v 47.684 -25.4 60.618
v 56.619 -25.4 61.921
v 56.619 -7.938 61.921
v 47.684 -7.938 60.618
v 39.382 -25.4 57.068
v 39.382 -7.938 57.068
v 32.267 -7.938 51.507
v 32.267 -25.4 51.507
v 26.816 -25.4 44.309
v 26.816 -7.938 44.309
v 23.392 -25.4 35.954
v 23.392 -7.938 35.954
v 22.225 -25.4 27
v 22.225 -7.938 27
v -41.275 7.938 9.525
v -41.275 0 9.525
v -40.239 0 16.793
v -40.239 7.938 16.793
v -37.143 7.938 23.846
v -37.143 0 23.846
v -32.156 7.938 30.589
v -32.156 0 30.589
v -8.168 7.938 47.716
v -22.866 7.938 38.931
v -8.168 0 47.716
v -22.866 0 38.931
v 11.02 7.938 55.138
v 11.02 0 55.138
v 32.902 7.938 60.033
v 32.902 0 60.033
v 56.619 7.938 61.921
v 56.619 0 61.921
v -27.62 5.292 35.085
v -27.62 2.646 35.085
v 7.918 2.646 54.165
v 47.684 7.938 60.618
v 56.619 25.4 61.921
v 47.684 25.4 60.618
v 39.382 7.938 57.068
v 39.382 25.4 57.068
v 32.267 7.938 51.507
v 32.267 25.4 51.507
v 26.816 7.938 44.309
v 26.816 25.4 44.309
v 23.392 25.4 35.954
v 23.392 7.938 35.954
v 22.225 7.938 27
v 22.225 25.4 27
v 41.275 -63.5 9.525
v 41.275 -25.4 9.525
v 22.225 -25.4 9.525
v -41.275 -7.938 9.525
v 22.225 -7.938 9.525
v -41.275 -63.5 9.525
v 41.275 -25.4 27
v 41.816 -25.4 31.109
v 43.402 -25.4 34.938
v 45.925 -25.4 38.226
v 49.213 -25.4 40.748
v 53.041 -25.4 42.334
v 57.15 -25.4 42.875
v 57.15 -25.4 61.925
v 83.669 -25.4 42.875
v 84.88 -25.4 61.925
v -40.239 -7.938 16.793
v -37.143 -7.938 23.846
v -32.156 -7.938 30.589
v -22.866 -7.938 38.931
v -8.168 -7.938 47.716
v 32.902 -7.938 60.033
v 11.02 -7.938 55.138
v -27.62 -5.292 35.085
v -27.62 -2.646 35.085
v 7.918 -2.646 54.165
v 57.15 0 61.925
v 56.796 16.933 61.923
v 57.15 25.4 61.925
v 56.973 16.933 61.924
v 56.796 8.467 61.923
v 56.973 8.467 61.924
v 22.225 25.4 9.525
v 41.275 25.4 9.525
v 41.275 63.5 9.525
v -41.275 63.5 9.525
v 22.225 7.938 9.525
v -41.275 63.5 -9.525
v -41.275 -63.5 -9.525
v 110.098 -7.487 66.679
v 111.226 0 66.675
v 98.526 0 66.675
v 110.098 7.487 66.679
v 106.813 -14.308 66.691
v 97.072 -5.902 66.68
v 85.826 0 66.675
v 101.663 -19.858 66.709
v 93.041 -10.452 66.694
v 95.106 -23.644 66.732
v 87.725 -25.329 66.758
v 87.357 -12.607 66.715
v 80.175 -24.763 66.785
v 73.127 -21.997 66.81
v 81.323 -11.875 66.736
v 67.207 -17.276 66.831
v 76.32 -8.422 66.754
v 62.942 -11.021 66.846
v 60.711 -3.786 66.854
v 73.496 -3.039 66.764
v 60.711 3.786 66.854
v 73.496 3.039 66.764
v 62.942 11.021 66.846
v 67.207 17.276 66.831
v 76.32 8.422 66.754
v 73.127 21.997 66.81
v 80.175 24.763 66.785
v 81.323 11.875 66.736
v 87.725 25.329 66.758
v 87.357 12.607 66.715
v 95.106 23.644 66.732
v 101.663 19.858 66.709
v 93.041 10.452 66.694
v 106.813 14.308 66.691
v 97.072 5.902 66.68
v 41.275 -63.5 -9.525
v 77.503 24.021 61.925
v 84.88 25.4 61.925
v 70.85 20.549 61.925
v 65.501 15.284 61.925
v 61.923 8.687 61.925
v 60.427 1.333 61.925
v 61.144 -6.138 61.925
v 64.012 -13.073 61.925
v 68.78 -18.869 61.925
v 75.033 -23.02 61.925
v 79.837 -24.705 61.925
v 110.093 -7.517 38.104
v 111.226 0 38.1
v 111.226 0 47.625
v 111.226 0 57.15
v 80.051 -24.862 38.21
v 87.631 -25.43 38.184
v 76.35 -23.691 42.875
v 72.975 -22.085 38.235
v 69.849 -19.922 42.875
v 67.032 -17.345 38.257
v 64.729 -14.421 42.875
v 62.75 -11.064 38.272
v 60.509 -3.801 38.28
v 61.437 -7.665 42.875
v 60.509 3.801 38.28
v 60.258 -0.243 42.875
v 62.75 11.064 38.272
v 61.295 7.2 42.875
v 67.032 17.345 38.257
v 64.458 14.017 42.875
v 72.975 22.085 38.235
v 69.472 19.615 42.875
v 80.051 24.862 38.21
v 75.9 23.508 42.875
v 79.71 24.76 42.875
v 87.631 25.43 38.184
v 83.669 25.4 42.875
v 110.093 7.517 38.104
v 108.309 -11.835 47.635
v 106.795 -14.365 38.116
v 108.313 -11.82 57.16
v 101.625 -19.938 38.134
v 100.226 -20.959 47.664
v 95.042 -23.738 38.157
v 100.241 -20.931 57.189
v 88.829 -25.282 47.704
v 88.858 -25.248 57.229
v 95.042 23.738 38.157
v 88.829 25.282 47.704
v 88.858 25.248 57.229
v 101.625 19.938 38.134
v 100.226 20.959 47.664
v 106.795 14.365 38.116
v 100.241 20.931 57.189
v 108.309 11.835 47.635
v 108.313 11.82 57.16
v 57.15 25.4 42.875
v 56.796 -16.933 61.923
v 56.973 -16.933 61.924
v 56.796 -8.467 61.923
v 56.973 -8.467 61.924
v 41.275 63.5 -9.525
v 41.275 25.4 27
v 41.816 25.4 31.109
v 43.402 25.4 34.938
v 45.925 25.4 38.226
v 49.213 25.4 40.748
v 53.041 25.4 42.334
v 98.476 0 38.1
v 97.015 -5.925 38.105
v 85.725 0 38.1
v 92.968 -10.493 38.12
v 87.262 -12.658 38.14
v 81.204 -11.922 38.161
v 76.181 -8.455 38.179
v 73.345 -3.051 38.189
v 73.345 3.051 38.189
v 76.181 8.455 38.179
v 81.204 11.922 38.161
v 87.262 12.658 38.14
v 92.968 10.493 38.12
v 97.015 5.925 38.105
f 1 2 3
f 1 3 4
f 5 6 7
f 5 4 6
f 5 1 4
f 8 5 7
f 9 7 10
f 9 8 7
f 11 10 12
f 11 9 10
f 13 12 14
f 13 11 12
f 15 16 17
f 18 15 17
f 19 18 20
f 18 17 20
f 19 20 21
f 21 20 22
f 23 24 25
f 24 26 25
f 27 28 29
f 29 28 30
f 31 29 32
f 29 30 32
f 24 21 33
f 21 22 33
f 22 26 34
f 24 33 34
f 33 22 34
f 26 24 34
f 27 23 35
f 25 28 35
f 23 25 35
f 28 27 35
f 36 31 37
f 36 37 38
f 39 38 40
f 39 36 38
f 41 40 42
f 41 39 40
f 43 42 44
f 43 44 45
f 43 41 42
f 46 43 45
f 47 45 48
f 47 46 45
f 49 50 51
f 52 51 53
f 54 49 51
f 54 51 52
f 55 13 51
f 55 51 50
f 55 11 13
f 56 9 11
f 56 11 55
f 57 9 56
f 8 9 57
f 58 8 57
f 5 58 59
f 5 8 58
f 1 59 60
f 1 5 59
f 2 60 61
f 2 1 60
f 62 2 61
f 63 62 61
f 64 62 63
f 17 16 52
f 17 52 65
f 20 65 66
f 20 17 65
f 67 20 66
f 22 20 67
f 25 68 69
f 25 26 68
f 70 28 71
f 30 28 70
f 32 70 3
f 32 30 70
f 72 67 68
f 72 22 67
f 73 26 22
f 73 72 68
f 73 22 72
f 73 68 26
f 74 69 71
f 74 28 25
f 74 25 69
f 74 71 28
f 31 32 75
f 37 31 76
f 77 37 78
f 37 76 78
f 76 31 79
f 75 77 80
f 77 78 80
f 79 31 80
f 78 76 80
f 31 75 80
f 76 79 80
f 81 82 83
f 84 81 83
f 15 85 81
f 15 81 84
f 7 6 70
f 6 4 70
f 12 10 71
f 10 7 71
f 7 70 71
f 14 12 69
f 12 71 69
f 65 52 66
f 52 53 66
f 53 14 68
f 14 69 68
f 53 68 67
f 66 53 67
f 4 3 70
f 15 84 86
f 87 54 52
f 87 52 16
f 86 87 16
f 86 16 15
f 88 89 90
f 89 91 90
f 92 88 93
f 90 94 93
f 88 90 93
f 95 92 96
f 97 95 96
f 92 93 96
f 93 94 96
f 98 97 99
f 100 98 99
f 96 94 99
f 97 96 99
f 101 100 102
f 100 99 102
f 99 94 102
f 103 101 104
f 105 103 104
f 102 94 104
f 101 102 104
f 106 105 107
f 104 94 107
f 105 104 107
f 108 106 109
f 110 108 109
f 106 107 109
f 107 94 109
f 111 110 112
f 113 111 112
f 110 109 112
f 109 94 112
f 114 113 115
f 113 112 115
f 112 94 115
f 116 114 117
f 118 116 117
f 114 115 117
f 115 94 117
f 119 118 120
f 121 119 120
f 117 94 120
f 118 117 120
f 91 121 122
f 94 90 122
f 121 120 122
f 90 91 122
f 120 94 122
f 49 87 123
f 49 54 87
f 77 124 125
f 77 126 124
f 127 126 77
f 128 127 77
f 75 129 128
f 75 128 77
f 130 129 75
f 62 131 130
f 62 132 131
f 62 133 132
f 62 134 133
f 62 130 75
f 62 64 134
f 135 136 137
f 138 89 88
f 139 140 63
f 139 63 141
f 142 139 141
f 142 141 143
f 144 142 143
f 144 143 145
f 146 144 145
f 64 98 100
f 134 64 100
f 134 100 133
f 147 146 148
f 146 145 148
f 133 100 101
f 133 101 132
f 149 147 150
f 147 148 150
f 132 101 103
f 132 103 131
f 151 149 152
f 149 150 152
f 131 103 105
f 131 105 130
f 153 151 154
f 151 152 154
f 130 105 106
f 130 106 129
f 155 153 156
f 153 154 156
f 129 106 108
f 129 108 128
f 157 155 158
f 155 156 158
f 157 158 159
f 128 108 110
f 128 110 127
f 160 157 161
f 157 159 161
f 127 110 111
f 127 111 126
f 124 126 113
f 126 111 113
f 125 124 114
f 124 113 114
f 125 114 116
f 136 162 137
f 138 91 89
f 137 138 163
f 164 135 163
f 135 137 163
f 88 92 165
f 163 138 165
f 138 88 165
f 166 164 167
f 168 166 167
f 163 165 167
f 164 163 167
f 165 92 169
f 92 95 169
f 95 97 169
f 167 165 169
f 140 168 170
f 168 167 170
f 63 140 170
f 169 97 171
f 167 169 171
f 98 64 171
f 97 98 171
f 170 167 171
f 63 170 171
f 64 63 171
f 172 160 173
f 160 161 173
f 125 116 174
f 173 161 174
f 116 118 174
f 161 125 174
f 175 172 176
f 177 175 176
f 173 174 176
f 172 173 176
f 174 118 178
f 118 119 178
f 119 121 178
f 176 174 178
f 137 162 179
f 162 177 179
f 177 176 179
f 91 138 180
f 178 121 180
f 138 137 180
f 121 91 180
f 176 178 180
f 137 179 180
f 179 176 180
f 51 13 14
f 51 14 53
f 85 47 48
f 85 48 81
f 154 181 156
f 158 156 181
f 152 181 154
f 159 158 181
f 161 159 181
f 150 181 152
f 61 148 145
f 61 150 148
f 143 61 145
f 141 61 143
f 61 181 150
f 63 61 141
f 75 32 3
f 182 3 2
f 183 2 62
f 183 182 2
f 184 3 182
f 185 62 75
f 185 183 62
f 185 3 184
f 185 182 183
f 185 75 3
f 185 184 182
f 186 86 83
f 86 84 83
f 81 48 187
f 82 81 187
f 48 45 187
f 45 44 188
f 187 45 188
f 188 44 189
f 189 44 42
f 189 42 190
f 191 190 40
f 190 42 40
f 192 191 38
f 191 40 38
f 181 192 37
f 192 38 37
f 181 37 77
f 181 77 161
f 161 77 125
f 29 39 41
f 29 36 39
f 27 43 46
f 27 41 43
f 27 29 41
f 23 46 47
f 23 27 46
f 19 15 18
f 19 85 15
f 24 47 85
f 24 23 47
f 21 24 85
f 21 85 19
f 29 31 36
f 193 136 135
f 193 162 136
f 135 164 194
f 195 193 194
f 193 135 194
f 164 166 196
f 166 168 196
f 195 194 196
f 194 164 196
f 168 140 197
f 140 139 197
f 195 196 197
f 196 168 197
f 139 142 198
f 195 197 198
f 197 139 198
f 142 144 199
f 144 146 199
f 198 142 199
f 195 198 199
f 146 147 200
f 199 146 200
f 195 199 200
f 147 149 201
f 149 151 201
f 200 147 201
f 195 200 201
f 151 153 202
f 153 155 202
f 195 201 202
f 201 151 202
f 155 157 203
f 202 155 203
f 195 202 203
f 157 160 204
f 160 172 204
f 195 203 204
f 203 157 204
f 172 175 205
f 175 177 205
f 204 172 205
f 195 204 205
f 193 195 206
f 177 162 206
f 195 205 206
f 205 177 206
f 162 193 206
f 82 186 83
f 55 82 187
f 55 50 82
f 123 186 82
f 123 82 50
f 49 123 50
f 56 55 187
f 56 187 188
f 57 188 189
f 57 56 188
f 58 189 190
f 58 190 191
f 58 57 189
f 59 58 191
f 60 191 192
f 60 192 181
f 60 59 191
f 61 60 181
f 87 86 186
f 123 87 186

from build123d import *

# Parameters (mm, degrees)
F1_DEPTH = 63.5
F0_W     = 25.298796773
F0_H     = 19.05
F2_DEPTH = 25.4
F3_DEPTH = 7.9375


with BuildPart() as f1:
    # F0 (on Front) → F1 (new body, symmetric)
    with BuildSketch(Plane.XZ):
        Polygon((-41.275, -9.525), (41.275, -9.525), (41.275, 9.525), (22.225, 9.525), (-41.275, 9.525), align=None)
    extrude(amount=F1_DEPTH, both=True)

    # F0 (on Front) → F2 (join, symmetric)
    with BuildSketch(Plane.XZ):
        with BuildLine():
            Line((22.225, 9.525), (41.275, 9.525))
            Line((41.275, 9.525), (41.275, 27.0002))
            ThreePointArc((41.275, 27.0002), (45.9246798487, 38.2255201513), (57.15, 42.8752))
            Line((57.15, 42.8752), (60.426203227, 42.8752))
            Line((60.426203227, 42.8752), (60.426203227, 61.9252))
            Line((60.426203227, 61.9252), (57.15, 61.9252))
            add(Edge.make_bspline(
                [(56.6191061184, 61.9211647159), (56.7959952463, 61.9227867022), (56.9729603774, 61.9241320768), (57.15, 61.9252)],
                knots=[111.1292180124, 111.1292180124, 111.1292180124, 111.1292180124, 111.5045361635, 111.5045361635, 111.5045361635, 111.5045361635], degree=3))
            ThreePointArc((56.6191061184, 61.9211647159), (32.2673042677, 51.5074862246), (22.225, 27.0002))
            Line((22.225, 27.0002), (22.225, 9.525))
        make_face()
        with Locations((73.0756016135, 52.4002)):
            Rectangle(F0_W, F0_H)
    extrude(amount=F2_DEPTH, both=True)

    # F0 (on Front) → F3 (join, symmetric)
    with BuildSketch(Plane.XZ):
        with BuildLine():
            add(Edge.make_bspline(
                [(-41.275, 9.525), (-41.4689858788, 36.7097428775), (4.2434072851, 61.440905318), (56.6191061184, 61.9211647159)],
                knots=[0, 0, 0, 0, 111.1292180124, 111.1292180124, 111.1292180124, 111.1292180124], degree=3))
            Line((-41.275, 9.525), (22.225, 9.525))
            Line((22.225, 9.525), (22.225, 27.0002))
            ThreePointArc((22.225, 27.0002), (32.2673042677, 51.5074862246), (56.6191061184, 61.9211647159))
        make_face()
    extrude(amount=F3_DEPTH, both=True)

    # F0 (on Front) → F4 (revolve)
    with BuildSketch(Plane.XZ):
        Polygon((85.826203227, 66.675), (85.725, 38.1), (111.226203227, 38.1), (111.226203227, 66.675), align=None)
    revolve(axis=Axis((85.7756016135, 0, 52.3875), (-0.003541648, 0, -0.9999937283)))


solid = f1.part
